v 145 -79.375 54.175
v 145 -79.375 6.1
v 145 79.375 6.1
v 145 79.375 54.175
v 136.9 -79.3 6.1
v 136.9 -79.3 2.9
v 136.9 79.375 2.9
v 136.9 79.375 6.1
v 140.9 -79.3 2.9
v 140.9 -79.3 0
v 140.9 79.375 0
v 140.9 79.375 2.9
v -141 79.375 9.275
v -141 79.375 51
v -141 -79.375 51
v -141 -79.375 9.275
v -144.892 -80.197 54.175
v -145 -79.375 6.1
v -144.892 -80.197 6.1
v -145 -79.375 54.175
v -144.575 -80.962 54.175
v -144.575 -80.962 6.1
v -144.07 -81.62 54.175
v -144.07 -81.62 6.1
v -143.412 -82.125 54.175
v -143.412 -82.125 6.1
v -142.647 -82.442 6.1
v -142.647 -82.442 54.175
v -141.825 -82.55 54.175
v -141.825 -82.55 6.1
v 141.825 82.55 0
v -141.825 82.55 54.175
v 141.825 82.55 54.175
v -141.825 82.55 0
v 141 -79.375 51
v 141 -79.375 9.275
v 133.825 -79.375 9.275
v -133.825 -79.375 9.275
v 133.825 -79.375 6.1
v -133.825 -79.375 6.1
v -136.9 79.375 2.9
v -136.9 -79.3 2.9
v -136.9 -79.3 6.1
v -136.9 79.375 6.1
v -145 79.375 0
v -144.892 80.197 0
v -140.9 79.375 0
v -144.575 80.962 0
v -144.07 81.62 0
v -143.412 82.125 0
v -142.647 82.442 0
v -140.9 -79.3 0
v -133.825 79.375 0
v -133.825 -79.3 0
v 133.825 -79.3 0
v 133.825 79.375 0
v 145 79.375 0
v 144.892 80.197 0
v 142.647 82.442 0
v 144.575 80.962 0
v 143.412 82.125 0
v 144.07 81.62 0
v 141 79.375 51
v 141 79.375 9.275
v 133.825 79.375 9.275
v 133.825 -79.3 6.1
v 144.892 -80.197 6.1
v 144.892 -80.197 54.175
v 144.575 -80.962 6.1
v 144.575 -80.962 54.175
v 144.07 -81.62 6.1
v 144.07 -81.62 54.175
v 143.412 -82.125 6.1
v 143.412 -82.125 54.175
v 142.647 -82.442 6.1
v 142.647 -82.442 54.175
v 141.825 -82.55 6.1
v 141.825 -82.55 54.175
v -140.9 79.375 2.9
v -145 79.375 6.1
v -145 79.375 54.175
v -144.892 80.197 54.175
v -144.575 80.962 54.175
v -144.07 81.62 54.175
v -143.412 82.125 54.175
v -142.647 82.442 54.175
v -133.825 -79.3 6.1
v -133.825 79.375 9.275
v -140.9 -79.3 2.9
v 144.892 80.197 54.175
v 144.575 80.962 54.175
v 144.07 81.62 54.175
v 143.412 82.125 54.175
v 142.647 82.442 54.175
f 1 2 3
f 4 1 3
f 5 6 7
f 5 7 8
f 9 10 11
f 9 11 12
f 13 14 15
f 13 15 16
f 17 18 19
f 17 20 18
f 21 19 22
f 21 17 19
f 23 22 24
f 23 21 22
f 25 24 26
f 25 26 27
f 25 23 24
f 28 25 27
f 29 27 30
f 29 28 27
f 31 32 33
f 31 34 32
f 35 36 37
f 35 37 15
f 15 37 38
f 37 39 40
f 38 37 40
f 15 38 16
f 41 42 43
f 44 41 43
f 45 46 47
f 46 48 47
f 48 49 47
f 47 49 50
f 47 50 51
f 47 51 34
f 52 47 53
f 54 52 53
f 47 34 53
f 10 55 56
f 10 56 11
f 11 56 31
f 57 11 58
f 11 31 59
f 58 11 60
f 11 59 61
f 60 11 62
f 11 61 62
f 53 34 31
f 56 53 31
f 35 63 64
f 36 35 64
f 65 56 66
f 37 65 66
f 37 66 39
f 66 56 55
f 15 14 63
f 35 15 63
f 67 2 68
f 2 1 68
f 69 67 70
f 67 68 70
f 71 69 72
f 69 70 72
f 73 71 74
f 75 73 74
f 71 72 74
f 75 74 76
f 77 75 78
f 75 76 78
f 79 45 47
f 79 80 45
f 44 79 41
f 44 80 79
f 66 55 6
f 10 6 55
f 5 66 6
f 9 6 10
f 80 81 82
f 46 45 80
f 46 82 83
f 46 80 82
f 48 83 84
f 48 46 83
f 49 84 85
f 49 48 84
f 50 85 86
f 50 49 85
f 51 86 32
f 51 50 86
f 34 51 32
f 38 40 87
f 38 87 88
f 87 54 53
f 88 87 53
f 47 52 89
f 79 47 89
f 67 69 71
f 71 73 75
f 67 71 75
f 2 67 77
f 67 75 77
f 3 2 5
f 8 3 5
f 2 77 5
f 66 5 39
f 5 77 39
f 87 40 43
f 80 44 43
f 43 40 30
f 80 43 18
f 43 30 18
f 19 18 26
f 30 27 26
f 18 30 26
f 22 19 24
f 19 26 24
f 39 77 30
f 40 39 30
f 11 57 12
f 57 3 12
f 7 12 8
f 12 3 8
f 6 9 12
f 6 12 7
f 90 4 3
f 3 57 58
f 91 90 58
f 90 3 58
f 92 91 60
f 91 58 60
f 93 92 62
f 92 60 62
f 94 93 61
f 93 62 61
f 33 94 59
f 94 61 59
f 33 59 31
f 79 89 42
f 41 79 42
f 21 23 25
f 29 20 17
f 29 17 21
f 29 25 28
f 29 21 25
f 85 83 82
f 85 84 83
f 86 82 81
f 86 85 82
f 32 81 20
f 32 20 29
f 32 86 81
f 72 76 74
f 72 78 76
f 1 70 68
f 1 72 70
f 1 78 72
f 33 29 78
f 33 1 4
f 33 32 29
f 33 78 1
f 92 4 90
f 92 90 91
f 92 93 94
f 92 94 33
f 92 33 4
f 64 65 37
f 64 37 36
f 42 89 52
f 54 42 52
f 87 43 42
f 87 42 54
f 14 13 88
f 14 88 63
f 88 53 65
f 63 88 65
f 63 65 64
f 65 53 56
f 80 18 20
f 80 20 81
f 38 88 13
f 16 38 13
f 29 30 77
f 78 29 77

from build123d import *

# Parameters (mm, degrees)
SKETCH2_W           = 290
SKETCH2_H           = 165.1
BOSS_EXTRUDE1_DEPTH = 51
SKETCH3_W           = 290
SKETCH3_H           = 165.1
BOSS_EXTRUDE2_DEPTH = 3.175
CUT_EXTRUDE1_DEPTH  = 161.925
SKETCH7_W           = 7.175
SKETCH7_H           = 41.725
CUT_EXTRUDE3_DEPTH  = 158.75
FILLET1_R           = 3.175
SKETCH8_W           = 290
SKETCH8_H           = 6.1
CUT_EXTRUDE4_DEPTH  = 3.25


with BuildPart() as part:
    # Sketch2 → Boss-Extrude1 (new body)
    with BuildSketch(Plane.XY):
        Rectangle(SKETCH2_W, SKETCH2_H)
        Polygon((133.825, 71.375), (133.825, -71.375), (133.825, -79.375), (-133.825, -79.375), (-133.825, -71.375), (-133.825, 71.375), (-133.825, 79.375), (133.825, 79.375), align=None, mode=Mode.SUBTRACT)
    extrude(amount=BOSS_EXTRUDE1_DEPTH)

    # Sketch3 → Boss-Extrude2 (add)
    with BuildSketch(Plane.XY.offset(51)):
        Rectangle(SKETCH3_W, SKETCH3_H)
    extrude(amount=BOSS_EXTRUDE2_DEPTH)

    # Sketch4 → Cut-Extrude1 (cut)
    with BuildSketch(Plane.XZ.offset(82.55)):
        Polygon((140.9, 2.9), (136.9, 2.9), (136.9, 6.1), (145, 6.1), (145, 2.9), (145, 0), (140.9, 0), align=None)
    cut_extrude1 = extrude(amount=-CUT_EXTRUDE1_DEPTH, mode=Mode.SUBTRACT)

    # Mirror1: Cut-Extrude1 across plane
    add(cut_extrude1.mirror(Plane(origin=(0, 0, 0), x_dir=(0, 0, 1), z_dir=(1, 0, 0))), mode=Mode.SUBTRACT)

    # Sketch7 → Cut-Extrude3 (cut)
    with BuildSketch(Plane(origin=(0, 79.375, 0), x_dir=(1, 0, 0), z_dir=(0, 1, 0))):
        with Locations((137.4125, -30.1375)):
            Rectangle(SKETCH7_W, SKETCH7_H)
    cut_extrude3 = extrude(amount=-CUT_EXTRUDE3_DEPTH, mode=Mode.SUBTRACT)

    # Mirror4: Cut-Extrude3 across plane
    add(cut_extrude3.mirror(Plane(origin=(0, 0, 0), x_dir=(0, 0, 1), z_dir=(1, 0, 0))), mode=Mode.SUBTRACT)

    # Fillet1
    fillet1_edges = [part.edges().sort_by_distance(p)[0] for p in [
        (145, -82.55, 30.1375),
        (-145, -82.55, 30.1375),
        (-145, 82.55, 27.0875),
        (145, 82.55, 27.0875),
    ]]
    fillet(fillet1_edges, radius=FILLET1_R)

    # Sketch8 → Cut-Extrude4 (cut)
    with BuildSketch(Plane.XZ.offset(82.55)):
        with Locations((0, 3.05)):
            Rectangle(SKETCH8_W, SKETCH8_H)
    extrude(amount=-CUT_EXTRUDE4_DEPTH, mode=Mode.SUBTRACT)


solid = part.part
